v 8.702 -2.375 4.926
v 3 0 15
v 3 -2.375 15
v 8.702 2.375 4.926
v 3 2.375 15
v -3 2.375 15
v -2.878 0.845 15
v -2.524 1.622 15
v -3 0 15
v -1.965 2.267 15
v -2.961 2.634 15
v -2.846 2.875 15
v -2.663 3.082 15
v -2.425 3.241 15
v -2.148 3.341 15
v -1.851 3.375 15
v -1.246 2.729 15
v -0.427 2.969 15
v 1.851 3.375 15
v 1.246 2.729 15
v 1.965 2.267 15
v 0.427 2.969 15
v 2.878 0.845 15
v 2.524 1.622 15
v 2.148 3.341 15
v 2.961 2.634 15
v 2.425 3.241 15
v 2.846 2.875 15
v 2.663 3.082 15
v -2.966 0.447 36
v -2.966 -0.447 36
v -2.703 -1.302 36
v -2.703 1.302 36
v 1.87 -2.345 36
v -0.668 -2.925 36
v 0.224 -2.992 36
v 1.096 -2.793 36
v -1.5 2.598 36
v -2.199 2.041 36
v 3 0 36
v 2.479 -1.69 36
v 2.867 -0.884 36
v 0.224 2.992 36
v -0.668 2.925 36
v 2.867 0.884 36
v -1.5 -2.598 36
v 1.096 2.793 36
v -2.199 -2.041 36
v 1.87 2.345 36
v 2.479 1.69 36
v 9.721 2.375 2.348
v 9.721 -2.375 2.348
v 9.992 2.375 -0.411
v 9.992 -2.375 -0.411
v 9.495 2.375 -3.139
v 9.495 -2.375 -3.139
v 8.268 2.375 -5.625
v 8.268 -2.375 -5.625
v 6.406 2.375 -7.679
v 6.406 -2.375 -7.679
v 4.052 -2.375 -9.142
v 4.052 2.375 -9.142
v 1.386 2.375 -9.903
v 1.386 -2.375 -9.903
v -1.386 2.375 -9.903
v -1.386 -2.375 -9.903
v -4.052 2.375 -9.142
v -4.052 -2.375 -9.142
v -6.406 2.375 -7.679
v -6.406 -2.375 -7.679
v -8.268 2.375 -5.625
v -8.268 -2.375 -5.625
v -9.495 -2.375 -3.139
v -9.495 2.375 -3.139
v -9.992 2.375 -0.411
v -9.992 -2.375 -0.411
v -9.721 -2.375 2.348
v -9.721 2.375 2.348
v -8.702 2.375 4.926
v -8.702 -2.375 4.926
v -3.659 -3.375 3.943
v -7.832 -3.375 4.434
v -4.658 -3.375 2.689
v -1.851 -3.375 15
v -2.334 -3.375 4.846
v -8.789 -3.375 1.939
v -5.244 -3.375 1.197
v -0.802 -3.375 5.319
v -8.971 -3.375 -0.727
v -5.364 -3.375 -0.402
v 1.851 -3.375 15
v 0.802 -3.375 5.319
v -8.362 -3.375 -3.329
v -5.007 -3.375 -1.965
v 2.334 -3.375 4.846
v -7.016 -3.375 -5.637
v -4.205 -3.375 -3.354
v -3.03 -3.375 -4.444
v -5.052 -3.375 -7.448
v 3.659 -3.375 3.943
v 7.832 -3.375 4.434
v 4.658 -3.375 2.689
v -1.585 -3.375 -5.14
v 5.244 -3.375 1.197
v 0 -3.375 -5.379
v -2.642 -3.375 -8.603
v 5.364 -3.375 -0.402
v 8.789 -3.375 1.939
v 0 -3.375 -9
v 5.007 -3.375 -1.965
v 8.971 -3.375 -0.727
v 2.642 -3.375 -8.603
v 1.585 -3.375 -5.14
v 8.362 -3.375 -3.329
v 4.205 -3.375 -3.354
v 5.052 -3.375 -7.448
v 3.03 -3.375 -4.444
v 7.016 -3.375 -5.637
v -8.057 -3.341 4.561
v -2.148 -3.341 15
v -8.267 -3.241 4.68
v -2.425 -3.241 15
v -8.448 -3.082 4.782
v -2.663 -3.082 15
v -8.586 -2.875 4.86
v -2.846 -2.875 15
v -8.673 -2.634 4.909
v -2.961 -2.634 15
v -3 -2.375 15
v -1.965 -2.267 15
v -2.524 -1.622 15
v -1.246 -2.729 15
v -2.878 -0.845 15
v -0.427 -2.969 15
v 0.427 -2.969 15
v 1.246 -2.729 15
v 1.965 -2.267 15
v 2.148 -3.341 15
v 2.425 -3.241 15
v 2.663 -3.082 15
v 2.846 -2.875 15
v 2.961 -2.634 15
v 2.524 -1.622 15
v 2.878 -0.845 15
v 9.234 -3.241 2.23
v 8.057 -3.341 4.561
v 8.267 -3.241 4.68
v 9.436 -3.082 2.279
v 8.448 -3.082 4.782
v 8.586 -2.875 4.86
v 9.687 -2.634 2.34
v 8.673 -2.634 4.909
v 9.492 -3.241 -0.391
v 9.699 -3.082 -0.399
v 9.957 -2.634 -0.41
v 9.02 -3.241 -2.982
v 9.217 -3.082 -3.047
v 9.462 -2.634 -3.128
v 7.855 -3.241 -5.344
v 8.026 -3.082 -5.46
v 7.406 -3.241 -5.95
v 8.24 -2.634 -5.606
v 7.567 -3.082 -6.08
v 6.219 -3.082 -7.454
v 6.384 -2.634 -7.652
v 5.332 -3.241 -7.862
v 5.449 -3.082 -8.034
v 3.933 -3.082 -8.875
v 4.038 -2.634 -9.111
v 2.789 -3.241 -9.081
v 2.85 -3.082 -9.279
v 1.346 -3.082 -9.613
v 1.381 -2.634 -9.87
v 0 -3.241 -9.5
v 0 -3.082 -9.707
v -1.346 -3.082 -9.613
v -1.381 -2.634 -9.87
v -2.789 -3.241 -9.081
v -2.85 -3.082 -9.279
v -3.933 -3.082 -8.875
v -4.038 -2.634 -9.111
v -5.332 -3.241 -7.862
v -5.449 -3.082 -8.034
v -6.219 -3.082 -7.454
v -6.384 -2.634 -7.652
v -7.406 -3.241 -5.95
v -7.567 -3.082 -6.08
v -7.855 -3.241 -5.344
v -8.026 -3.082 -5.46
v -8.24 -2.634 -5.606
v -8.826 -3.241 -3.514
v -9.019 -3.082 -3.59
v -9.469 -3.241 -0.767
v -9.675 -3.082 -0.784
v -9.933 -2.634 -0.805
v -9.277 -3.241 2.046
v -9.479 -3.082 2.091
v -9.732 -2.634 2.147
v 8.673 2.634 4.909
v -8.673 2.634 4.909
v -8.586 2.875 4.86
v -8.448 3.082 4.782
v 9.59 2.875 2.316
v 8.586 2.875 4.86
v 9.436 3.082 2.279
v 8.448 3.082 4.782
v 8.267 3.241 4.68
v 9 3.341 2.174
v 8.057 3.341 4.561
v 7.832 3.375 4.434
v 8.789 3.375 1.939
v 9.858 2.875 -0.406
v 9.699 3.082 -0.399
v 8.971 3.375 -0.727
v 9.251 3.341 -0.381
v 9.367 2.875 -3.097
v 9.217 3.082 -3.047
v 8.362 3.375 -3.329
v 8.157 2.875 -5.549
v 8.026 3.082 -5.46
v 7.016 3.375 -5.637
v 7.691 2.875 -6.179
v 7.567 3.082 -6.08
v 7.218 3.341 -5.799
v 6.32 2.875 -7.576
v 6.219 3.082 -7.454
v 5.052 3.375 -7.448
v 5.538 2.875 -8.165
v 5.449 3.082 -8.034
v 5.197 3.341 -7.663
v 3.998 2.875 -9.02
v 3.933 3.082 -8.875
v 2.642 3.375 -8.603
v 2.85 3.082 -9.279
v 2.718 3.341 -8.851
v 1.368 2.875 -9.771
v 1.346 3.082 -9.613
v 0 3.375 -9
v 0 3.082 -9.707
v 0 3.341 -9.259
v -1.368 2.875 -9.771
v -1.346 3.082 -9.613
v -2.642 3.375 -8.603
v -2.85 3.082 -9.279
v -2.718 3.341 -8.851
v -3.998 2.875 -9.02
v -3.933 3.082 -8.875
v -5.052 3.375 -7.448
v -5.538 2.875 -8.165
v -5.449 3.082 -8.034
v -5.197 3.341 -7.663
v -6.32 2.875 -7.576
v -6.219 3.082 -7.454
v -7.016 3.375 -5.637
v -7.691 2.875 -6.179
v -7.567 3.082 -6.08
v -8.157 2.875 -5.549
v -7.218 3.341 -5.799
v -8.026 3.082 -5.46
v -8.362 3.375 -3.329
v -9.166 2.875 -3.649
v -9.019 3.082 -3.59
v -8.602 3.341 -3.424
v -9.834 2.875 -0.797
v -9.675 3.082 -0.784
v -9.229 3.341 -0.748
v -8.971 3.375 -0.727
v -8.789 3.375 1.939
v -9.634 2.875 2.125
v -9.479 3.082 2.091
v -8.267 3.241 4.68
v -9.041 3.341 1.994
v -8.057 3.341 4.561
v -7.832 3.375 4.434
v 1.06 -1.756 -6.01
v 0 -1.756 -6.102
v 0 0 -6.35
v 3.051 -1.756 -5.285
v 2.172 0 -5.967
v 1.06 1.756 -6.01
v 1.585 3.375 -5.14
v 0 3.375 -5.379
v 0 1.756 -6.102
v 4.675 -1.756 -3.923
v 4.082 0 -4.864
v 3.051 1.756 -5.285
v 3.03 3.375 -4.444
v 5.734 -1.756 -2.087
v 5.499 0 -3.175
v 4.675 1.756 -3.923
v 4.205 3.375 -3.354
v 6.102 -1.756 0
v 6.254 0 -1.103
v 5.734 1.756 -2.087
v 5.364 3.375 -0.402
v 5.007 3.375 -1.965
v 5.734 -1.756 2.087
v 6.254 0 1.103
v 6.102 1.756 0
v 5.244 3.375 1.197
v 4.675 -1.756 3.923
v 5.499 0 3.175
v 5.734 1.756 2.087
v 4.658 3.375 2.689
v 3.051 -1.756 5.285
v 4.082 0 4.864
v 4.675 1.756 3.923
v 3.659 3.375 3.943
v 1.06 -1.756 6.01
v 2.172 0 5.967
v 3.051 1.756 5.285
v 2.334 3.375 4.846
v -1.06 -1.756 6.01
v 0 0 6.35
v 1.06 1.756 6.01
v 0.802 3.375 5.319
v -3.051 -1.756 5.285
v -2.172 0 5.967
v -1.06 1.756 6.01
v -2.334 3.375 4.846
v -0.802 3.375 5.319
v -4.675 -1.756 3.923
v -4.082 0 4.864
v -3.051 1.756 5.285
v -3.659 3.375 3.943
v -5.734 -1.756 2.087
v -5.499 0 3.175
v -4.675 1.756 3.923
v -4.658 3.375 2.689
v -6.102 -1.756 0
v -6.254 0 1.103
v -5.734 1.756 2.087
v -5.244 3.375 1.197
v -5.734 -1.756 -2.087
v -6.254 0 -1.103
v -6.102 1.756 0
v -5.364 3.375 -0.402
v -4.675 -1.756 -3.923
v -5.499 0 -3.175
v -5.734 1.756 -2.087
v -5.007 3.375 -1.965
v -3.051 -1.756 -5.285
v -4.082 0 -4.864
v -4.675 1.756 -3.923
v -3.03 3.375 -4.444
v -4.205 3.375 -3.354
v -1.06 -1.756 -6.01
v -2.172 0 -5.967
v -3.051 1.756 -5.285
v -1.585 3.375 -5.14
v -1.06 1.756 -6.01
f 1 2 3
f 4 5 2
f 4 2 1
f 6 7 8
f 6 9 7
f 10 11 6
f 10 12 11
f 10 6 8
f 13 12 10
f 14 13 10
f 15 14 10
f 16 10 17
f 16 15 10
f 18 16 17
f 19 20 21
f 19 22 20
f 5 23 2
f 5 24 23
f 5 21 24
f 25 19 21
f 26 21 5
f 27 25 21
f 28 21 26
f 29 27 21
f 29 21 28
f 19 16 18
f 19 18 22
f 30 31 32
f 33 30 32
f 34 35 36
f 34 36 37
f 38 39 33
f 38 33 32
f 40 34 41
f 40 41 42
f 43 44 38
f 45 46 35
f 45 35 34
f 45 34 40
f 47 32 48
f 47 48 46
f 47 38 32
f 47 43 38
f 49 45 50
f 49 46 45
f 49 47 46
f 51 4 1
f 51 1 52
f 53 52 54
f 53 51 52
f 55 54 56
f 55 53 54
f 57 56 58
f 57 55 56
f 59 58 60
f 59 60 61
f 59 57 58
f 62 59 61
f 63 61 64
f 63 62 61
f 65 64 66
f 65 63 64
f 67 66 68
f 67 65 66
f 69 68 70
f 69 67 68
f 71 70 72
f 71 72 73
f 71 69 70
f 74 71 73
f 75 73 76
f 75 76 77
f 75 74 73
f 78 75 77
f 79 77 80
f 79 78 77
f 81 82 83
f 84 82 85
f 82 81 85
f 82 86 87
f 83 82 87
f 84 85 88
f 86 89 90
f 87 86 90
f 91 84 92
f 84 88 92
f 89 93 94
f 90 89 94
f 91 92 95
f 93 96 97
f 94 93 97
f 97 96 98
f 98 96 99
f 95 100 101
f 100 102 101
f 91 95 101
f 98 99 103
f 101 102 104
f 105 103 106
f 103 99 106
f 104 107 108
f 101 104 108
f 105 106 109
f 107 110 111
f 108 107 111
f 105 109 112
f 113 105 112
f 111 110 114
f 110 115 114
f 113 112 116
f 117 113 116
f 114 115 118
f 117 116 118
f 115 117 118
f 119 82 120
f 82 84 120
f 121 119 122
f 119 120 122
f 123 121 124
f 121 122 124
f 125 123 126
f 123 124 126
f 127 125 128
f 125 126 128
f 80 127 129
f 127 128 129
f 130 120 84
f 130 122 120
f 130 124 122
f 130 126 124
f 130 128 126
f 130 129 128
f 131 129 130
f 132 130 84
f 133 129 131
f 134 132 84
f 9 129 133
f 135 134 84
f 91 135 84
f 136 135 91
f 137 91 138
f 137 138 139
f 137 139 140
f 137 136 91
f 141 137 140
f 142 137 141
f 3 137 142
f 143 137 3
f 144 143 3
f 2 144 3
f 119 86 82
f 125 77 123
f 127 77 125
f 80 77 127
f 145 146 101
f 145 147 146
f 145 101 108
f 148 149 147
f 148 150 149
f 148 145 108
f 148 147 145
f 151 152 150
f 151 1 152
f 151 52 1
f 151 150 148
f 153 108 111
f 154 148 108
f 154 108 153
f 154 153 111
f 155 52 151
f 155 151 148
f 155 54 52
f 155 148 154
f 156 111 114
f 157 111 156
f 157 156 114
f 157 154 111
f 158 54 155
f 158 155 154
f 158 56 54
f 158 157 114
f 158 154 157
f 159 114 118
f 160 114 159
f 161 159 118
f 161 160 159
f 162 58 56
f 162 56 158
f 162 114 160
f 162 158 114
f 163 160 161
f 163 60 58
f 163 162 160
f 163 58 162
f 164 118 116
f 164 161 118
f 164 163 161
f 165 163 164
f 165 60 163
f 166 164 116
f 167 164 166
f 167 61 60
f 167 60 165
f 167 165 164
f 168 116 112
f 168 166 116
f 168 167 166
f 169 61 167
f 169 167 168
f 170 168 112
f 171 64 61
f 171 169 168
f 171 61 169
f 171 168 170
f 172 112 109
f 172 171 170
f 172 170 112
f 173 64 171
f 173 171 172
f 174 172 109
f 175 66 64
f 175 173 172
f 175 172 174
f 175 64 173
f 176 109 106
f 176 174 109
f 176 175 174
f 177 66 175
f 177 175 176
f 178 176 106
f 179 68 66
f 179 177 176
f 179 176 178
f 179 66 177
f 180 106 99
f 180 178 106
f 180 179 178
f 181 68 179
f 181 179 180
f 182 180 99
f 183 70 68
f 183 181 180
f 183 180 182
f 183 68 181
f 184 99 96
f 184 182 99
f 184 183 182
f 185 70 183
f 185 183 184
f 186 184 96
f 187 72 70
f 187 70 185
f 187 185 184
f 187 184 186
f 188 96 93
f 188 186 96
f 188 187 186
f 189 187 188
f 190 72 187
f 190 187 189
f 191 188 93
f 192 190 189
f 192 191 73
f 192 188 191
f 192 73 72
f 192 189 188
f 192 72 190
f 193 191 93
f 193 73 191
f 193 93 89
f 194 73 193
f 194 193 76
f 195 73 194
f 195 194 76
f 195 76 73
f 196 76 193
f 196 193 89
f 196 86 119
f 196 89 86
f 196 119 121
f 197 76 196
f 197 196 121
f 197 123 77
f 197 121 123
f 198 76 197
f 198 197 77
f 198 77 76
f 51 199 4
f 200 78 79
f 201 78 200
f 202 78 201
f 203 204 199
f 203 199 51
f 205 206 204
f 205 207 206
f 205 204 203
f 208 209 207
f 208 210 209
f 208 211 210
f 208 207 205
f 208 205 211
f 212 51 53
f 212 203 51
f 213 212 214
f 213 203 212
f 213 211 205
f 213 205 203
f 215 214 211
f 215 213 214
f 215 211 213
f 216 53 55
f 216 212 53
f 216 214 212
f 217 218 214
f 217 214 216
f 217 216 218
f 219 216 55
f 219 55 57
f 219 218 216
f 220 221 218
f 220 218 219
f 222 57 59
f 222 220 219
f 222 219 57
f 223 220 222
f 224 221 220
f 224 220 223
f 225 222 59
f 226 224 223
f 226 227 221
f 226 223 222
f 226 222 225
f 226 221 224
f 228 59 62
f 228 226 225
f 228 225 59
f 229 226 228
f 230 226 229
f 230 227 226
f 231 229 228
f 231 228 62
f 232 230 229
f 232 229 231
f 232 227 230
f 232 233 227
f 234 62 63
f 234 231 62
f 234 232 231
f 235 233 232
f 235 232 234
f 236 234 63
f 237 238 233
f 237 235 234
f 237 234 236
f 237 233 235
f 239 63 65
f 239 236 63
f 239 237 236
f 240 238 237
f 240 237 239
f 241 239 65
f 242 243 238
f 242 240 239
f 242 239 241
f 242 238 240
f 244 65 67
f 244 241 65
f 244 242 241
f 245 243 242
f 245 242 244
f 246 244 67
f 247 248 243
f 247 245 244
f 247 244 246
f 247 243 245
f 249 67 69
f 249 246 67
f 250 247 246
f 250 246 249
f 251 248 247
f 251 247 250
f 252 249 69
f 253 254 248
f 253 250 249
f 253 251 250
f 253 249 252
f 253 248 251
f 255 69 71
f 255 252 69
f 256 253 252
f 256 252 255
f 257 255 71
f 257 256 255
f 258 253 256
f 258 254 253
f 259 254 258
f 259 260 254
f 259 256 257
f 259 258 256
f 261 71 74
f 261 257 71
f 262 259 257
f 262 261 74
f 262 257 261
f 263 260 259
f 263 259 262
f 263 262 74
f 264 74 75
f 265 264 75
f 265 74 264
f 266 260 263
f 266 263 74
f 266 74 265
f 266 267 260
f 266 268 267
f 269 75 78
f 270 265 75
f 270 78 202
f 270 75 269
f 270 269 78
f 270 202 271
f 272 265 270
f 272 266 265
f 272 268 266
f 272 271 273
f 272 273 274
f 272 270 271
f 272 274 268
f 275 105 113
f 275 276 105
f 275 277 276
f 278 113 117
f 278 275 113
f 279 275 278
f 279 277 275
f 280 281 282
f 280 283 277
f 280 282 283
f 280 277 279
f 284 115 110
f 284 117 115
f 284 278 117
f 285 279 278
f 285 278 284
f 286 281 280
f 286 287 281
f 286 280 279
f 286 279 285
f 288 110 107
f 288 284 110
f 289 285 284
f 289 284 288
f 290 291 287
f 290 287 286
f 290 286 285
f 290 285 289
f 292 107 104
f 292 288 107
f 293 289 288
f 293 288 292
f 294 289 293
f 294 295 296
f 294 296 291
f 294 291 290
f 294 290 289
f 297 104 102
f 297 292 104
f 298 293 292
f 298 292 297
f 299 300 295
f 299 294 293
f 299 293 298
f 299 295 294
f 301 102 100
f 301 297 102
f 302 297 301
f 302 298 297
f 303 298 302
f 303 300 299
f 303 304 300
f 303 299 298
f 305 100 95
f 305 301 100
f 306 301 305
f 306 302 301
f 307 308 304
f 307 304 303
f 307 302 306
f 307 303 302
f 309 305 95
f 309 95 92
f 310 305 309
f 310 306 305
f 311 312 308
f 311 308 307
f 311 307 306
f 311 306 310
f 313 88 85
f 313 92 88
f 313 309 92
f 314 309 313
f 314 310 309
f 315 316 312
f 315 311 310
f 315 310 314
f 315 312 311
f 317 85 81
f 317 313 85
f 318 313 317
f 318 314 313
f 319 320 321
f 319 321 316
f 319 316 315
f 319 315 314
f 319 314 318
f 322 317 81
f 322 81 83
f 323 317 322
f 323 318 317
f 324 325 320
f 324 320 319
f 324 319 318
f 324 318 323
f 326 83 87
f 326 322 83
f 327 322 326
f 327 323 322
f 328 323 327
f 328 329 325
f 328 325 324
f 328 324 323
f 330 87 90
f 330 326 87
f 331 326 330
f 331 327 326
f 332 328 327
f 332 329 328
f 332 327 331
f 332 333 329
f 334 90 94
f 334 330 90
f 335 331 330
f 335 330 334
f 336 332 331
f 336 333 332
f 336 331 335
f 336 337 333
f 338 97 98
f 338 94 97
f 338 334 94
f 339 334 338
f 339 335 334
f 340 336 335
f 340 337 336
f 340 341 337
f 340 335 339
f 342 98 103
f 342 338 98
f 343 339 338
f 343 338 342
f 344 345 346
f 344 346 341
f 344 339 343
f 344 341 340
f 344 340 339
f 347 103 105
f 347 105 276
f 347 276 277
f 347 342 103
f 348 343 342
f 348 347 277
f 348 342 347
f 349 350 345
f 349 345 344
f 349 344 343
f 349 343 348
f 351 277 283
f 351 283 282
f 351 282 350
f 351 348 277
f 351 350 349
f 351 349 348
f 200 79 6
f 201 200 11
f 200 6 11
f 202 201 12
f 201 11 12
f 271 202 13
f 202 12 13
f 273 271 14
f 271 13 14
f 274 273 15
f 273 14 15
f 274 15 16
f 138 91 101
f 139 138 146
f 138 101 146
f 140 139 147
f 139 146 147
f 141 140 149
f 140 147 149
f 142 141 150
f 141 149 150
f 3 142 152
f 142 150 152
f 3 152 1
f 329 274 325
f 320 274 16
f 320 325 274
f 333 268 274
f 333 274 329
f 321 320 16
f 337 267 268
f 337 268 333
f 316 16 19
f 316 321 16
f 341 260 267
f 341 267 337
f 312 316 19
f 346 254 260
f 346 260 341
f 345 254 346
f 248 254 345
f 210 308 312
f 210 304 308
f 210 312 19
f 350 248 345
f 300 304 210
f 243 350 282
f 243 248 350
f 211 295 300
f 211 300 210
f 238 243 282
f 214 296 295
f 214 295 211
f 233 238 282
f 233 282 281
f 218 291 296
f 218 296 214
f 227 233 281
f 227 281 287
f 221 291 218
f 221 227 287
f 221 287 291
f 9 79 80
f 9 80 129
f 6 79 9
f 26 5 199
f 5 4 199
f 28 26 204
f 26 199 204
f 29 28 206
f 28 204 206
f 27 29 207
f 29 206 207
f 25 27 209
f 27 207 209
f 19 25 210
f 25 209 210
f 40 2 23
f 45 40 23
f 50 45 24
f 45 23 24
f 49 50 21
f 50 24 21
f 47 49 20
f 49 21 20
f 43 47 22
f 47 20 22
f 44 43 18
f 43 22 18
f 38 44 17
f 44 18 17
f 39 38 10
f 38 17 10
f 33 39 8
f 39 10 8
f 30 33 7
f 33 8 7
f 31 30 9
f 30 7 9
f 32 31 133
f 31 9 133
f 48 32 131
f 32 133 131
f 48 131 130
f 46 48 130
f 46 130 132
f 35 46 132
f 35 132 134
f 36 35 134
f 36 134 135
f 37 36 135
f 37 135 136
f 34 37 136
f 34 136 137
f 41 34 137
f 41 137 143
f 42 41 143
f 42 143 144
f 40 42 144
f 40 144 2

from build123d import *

# Parameters (mm, degrees)
EXTRUDE_1_DEPTH = 3.375
FILLET_1_R      = 1
SKETCH_3_R      = 3
EXTRUDE_2_DEPTH = 21


with BuildPart() as part:
    # 草图1 → 凸台-拉伸1 (new body, symmetric)
    with BuildSketch(Plane(origin=(0, 0, 0), x_dir=(1, 0, 0), z_dir=(0, 1, 0))):
        with BuildLine():
            Line((-3, -15), (3, -15))
            Line((3, -15), (8.702459553, -4.926174756))
            ThreePointArc((8.702459553, -4.926174756), (0, 10), (-8.702459553, -4.926174756))
            Line((-8.702459553, -4.926174756), (-3, -15))
        make_face()
    extrude(amount=EXTRUDE_1_DEPTH, both=True)

    # 草图2 → 切除-旋转1 (revolve, cut)
    with BuildSketch(Plane(origin=(0, 0, 0), x_dir=(0, 0, -1), z_dir=(1, 0, 0))):
        with BuildLine():
            Line((0, 6.35), (0, -6.35))
            ThreePointArc((0, -6.35), (6.35, 0), (0, 6.35))
        make_face()
    revolve(axis=Axis((0, 6.35, 0), (0, -1, 0)), mode=Mode.SUBTRACT)

    # 圆角1
    fillet_1_edges = [part.edges().sort_by_distance(p)[0] for p in [
        (5.851229777, 3.375, 9.963087378),
        (0, 3.375, -10),
        (-5.851229777, 3.375, 9.963087378),
        (0, -3.375, -10),
        (5.851229777, -3.375, 9.963087378),
        (-5.851229777, -3.375, 9.963087378),
    ]]
    fillet(fillet_1_edges, radius=FILLET_1_R)

    # 草图3 → 凸台-拉伸2 (add)
    with BuildSketch(Plane.XY.offset(15)):
        Circle(SKETCH_3_R)
    extrude(amount=EXTRUDE_2_DEPTH)


solid = part.part
